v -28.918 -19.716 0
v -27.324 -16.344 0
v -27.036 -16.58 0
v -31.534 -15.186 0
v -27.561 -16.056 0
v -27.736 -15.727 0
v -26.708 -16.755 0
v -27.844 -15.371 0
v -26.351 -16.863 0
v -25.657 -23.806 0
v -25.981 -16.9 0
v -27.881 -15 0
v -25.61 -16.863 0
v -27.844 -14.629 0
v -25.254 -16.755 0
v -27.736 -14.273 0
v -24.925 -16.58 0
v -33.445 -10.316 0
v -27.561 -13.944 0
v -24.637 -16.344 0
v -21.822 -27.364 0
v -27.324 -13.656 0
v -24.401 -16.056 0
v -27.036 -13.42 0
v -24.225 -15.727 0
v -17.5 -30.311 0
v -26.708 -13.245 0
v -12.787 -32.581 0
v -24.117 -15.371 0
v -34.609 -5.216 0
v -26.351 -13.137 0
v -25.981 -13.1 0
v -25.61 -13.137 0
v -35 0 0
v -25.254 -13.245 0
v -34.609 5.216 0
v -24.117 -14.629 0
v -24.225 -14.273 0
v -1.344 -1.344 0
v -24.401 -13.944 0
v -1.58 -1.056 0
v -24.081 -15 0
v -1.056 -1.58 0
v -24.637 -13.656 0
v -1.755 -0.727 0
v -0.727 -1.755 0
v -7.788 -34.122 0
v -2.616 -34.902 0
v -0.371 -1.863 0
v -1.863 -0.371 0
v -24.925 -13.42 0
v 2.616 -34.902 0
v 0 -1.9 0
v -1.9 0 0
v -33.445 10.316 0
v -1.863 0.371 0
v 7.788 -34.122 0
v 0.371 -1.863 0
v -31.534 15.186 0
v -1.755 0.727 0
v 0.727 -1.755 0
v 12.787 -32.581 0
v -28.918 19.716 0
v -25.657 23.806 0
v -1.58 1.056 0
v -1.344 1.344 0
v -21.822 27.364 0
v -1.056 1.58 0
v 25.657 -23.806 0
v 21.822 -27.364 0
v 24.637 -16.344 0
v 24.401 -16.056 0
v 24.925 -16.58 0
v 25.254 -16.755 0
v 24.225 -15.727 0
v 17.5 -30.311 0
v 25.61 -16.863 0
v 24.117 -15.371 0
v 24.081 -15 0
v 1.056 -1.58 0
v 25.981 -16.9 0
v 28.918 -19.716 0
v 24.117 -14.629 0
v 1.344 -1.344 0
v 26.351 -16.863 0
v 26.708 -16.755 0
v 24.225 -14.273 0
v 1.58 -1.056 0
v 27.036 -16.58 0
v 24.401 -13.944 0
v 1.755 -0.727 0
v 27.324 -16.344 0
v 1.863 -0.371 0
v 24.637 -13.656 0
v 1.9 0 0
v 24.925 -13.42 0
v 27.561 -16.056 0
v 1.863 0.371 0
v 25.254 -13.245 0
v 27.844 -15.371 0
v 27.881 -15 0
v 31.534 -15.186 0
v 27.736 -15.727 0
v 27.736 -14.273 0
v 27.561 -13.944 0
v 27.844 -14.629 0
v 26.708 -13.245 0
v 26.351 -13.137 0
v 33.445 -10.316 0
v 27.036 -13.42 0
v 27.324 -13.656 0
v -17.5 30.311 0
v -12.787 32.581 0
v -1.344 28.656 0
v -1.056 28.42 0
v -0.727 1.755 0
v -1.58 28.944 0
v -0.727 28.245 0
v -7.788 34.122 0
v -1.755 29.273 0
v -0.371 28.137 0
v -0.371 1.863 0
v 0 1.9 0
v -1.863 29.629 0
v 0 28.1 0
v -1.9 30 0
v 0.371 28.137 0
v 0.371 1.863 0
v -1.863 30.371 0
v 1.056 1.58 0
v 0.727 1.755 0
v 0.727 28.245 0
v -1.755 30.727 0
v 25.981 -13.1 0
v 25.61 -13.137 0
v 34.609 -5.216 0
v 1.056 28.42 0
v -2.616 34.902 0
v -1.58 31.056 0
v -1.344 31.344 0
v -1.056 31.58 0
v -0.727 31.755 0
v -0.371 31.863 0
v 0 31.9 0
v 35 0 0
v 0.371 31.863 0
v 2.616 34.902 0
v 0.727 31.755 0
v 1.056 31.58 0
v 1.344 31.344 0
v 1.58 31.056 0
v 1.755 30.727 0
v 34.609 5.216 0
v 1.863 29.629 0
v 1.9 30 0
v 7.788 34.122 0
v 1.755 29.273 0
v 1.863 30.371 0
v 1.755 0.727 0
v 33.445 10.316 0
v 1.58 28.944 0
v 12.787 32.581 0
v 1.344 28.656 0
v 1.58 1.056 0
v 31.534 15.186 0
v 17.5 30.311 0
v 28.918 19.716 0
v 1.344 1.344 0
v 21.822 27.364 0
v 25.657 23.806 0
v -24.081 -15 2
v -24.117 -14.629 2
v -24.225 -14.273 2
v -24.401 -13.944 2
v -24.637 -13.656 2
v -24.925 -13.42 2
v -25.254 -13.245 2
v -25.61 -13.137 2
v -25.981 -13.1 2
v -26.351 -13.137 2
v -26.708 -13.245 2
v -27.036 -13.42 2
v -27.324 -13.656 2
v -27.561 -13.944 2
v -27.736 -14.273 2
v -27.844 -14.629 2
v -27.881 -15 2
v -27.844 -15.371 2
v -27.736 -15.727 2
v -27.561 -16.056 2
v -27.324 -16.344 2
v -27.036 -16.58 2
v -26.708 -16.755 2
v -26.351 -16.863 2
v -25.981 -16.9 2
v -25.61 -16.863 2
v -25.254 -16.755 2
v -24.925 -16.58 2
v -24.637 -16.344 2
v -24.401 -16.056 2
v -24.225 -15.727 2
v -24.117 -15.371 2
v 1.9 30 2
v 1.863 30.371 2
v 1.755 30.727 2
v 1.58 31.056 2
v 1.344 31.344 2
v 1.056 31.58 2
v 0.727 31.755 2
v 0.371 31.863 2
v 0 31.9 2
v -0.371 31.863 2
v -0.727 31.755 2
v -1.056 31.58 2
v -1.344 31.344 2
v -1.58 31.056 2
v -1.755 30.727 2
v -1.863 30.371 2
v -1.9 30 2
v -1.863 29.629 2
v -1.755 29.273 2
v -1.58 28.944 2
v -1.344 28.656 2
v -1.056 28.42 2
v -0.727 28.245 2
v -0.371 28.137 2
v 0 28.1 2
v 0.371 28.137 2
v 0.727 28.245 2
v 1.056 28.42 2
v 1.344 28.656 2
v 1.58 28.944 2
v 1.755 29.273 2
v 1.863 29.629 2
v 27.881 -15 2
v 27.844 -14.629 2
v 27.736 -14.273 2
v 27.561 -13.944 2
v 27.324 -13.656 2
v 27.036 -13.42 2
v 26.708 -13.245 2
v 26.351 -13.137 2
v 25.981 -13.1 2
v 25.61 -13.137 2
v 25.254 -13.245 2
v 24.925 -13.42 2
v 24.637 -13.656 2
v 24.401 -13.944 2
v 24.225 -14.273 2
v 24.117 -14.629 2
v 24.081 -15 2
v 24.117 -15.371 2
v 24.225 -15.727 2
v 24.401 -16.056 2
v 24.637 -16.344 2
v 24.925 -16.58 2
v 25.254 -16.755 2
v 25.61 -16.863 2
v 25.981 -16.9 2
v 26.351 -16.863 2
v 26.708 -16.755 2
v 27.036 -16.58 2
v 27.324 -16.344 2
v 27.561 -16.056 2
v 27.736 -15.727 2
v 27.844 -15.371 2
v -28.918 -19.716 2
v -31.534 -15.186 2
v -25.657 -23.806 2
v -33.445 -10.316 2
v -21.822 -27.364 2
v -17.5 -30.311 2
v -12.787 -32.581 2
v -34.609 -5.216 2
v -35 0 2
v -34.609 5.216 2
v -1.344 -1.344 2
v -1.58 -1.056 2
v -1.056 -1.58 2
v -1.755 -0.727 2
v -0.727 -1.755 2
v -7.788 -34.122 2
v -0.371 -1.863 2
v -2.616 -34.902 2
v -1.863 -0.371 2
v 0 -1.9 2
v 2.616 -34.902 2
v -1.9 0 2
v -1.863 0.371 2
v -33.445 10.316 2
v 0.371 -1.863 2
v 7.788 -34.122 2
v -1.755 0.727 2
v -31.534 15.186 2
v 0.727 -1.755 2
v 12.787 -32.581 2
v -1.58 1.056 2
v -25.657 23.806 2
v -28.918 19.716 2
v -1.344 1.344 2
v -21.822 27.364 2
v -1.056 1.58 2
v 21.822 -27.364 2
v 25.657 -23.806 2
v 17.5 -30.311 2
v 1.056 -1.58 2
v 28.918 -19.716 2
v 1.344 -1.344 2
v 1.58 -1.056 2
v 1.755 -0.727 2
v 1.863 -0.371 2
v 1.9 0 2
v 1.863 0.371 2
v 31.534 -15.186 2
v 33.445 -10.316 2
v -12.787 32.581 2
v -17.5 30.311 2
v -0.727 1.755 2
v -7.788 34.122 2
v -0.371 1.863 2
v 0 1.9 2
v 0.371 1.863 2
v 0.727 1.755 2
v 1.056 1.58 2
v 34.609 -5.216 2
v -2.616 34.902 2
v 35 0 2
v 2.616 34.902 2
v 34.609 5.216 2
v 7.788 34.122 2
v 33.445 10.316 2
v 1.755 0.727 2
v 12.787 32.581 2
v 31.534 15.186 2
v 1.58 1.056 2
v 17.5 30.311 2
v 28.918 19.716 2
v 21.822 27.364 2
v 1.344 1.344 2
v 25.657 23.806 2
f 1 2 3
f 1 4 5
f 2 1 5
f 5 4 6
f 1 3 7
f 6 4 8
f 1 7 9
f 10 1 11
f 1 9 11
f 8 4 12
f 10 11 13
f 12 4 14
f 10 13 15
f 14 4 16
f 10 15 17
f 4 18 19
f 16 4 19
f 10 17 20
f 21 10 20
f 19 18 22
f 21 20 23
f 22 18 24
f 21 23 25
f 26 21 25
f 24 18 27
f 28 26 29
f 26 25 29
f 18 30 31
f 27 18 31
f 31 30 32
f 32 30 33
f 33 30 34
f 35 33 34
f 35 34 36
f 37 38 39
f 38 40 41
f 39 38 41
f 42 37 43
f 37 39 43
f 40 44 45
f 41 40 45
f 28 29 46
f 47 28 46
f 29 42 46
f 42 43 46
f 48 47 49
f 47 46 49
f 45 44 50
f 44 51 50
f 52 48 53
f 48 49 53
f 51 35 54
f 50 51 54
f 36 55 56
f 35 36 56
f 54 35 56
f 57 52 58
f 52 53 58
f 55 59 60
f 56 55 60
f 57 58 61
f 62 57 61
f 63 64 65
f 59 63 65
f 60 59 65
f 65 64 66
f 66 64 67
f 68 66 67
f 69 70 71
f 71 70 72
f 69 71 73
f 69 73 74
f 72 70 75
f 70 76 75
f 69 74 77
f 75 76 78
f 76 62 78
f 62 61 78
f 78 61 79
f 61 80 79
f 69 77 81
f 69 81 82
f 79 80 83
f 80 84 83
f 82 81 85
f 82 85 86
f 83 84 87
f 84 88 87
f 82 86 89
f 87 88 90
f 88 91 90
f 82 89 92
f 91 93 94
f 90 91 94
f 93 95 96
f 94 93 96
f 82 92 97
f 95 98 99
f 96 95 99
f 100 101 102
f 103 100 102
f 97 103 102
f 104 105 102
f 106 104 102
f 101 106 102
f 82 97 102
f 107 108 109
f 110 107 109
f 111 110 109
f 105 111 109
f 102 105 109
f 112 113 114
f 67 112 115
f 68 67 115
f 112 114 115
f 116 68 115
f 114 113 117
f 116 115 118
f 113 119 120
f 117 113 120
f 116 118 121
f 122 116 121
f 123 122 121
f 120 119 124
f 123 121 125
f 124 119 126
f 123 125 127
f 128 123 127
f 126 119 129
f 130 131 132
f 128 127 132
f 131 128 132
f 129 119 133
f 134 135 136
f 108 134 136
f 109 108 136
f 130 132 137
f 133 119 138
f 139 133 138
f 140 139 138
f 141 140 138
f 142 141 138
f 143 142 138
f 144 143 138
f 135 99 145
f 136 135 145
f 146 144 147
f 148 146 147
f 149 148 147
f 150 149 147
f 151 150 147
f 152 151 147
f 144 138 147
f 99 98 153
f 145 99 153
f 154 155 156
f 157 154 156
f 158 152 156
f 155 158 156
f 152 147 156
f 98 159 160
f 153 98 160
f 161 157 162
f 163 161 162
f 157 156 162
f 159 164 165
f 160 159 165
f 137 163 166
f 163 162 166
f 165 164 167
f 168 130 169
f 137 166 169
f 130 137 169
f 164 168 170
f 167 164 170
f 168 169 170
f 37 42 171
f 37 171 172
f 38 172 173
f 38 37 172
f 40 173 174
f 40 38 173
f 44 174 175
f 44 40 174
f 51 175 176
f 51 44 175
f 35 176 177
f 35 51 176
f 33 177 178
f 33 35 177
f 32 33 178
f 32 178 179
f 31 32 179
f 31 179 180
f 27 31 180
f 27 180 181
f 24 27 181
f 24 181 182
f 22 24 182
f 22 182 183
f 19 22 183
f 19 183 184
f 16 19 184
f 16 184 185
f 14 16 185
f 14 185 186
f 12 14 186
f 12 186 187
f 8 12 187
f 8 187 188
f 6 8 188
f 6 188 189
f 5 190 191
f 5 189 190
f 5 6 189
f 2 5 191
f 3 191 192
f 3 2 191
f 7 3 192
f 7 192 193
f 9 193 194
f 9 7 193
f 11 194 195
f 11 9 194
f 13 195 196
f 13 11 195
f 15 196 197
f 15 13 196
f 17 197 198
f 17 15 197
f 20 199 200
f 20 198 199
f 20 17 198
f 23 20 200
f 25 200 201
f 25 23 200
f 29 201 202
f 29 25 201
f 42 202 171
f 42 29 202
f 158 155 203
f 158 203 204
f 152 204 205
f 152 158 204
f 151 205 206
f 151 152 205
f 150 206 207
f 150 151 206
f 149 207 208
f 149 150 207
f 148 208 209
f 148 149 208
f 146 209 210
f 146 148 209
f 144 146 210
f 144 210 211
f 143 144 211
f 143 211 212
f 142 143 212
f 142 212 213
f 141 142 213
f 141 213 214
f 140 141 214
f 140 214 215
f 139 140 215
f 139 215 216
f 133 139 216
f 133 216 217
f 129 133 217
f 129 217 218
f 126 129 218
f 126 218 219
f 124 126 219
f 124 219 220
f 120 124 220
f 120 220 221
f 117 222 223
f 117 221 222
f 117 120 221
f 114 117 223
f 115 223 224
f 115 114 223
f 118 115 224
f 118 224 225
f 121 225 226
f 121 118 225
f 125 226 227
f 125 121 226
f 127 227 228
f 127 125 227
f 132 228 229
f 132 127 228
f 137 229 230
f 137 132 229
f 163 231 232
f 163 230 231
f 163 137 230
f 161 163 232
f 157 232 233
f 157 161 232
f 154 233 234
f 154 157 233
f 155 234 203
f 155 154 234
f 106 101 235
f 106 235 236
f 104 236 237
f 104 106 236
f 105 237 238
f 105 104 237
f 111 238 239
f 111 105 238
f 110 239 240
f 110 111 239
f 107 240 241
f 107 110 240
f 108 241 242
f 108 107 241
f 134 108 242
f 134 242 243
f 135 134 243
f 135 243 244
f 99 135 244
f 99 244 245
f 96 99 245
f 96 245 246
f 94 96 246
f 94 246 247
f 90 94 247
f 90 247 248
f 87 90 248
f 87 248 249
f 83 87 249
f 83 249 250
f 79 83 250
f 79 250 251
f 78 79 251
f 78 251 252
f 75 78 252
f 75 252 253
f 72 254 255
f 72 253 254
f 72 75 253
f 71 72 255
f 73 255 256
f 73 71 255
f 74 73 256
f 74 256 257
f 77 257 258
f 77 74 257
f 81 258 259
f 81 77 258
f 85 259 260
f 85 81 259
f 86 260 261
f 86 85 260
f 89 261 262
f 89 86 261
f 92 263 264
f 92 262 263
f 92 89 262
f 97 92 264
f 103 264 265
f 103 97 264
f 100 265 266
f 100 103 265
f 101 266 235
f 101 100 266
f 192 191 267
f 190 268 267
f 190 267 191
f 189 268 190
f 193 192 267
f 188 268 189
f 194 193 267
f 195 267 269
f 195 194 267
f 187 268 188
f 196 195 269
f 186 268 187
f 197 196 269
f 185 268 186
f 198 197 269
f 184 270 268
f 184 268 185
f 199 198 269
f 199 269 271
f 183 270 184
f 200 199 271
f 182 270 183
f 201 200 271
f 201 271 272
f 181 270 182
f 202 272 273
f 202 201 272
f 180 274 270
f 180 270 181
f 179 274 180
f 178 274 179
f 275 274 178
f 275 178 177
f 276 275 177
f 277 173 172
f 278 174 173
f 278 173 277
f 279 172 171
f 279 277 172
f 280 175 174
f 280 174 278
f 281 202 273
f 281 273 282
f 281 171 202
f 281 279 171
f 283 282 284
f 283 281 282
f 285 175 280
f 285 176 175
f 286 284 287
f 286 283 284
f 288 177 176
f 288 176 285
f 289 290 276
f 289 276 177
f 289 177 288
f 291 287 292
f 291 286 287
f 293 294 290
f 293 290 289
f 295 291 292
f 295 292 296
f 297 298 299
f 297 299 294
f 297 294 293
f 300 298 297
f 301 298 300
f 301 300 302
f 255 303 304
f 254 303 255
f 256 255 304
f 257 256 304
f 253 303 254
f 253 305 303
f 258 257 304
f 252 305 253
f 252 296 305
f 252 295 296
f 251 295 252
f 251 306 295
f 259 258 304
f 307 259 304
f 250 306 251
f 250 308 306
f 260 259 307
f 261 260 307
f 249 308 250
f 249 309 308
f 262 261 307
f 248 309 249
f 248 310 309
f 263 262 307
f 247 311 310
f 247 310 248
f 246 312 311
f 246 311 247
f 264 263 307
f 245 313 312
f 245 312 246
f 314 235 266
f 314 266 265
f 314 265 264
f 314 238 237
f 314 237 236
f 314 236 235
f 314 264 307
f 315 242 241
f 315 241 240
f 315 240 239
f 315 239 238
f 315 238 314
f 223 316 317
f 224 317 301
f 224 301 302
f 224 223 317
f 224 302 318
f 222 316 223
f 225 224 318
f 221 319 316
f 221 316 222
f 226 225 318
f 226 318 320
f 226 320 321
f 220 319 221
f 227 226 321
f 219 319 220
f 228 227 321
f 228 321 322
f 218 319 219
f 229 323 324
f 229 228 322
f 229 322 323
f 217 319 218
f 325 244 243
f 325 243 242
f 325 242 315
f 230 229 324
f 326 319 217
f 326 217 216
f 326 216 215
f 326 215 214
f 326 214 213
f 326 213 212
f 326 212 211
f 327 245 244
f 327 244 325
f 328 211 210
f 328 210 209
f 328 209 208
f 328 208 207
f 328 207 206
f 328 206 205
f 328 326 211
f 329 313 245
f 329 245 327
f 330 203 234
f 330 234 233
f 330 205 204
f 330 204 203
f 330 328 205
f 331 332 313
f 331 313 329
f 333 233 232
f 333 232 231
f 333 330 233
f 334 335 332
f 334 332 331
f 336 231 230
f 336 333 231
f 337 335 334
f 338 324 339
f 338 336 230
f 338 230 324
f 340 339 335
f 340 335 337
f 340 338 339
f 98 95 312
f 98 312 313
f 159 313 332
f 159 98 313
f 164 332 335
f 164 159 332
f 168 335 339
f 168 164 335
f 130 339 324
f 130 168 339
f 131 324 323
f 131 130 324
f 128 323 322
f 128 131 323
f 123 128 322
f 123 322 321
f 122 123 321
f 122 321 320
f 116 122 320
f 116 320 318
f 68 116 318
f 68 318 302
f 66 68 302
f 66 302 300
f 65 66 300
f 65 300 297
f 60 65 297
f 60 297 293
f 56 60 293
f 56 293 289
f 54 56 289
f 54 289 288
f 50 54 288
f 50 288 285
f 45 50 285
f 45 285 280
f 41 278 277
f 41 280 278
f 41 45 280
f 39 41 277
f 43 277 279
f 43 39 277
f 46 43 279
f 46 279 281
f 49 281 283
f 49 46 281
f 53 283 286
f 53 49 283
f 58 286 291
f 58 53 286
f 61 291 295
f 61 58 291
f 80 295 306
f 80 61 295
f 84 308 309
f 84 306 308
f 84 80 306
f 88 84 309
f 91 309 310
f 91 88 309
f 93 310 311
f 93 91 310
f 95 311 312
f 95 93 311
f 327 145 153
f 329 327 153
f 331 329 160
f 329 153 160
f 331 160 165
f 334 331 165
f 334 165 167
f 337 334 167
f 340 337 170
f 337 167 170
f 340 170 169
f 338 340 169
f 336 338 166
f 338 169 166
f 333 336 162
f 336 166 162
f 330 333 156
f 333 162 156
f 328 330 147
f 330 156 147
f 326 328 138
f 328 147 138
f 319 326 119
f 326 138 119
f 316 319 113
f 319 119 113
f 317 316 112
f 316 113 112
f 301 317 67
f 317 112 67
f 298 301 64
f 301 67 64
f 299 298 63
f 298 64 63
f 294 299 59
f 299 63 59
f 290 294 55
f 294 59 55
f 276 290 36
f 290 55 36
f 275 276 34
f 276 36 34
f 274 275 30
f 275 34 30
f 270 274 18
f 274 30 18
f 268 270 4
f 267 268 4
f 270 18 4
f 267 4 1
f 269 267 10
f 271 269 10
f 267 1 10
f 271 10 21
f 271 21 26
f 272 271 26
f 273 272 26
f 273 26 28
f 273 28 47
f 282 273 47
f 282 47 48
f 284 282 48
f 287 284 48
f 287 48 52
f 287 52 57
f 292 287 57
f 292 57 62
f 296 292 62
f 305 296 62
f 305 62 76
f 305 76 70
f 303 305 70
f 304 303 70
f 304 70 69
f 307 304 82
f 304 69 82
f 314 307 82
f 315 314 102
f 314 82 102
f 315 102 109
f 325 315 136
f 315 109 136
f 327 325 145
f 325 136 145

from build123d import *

# Parameters (mm, degrees)
SKETCH_1_R               = 35
EXTRUDE_1_DEPTH          = 2
CUT_EXTRUDE_1_DEPTH      = 50.537864306
CUT_EXTRUDE_1_DEPTH_BACK = 50.537864306
SKETCH_2_R               = 1.9


with BuildPart() as part:
    # ｽｹｯﾁ1 → ﾎﾞｽ - 押し出し1 (new body)
    with BuildSketch(Plane.XY):
        Circle(SKETCH_1_R)
    extrude(amount=EXTRUDE_1_DEPTH)

    # ｽｹｯﾁ2 → ｶｯﾄ - 押し出し1 (cut, two sides: drawn at the far end of the back side and taken through both)
    with BuildSketch(Plane.XY.offset(-CUT_EXTRUDE_1_DEPTH_BACK)):
        with Locations((0, 30)):
            Circle(SKETCH_2_R)
        with Locations((25.980762114, -15)):
            Circle(SKETCH_2_R)
        with Locations((-25.980762114, -15)):
            Circle(SKETCH_2_R)
        Circle(SKETCH_2_R)
    extrude(amount=CUT_EXTRUDE_1_DEPTH + CUT_EXTRUDE_1_DEPTH_BACK, mode=Mode.SUBTRACT)


solid = part.part
